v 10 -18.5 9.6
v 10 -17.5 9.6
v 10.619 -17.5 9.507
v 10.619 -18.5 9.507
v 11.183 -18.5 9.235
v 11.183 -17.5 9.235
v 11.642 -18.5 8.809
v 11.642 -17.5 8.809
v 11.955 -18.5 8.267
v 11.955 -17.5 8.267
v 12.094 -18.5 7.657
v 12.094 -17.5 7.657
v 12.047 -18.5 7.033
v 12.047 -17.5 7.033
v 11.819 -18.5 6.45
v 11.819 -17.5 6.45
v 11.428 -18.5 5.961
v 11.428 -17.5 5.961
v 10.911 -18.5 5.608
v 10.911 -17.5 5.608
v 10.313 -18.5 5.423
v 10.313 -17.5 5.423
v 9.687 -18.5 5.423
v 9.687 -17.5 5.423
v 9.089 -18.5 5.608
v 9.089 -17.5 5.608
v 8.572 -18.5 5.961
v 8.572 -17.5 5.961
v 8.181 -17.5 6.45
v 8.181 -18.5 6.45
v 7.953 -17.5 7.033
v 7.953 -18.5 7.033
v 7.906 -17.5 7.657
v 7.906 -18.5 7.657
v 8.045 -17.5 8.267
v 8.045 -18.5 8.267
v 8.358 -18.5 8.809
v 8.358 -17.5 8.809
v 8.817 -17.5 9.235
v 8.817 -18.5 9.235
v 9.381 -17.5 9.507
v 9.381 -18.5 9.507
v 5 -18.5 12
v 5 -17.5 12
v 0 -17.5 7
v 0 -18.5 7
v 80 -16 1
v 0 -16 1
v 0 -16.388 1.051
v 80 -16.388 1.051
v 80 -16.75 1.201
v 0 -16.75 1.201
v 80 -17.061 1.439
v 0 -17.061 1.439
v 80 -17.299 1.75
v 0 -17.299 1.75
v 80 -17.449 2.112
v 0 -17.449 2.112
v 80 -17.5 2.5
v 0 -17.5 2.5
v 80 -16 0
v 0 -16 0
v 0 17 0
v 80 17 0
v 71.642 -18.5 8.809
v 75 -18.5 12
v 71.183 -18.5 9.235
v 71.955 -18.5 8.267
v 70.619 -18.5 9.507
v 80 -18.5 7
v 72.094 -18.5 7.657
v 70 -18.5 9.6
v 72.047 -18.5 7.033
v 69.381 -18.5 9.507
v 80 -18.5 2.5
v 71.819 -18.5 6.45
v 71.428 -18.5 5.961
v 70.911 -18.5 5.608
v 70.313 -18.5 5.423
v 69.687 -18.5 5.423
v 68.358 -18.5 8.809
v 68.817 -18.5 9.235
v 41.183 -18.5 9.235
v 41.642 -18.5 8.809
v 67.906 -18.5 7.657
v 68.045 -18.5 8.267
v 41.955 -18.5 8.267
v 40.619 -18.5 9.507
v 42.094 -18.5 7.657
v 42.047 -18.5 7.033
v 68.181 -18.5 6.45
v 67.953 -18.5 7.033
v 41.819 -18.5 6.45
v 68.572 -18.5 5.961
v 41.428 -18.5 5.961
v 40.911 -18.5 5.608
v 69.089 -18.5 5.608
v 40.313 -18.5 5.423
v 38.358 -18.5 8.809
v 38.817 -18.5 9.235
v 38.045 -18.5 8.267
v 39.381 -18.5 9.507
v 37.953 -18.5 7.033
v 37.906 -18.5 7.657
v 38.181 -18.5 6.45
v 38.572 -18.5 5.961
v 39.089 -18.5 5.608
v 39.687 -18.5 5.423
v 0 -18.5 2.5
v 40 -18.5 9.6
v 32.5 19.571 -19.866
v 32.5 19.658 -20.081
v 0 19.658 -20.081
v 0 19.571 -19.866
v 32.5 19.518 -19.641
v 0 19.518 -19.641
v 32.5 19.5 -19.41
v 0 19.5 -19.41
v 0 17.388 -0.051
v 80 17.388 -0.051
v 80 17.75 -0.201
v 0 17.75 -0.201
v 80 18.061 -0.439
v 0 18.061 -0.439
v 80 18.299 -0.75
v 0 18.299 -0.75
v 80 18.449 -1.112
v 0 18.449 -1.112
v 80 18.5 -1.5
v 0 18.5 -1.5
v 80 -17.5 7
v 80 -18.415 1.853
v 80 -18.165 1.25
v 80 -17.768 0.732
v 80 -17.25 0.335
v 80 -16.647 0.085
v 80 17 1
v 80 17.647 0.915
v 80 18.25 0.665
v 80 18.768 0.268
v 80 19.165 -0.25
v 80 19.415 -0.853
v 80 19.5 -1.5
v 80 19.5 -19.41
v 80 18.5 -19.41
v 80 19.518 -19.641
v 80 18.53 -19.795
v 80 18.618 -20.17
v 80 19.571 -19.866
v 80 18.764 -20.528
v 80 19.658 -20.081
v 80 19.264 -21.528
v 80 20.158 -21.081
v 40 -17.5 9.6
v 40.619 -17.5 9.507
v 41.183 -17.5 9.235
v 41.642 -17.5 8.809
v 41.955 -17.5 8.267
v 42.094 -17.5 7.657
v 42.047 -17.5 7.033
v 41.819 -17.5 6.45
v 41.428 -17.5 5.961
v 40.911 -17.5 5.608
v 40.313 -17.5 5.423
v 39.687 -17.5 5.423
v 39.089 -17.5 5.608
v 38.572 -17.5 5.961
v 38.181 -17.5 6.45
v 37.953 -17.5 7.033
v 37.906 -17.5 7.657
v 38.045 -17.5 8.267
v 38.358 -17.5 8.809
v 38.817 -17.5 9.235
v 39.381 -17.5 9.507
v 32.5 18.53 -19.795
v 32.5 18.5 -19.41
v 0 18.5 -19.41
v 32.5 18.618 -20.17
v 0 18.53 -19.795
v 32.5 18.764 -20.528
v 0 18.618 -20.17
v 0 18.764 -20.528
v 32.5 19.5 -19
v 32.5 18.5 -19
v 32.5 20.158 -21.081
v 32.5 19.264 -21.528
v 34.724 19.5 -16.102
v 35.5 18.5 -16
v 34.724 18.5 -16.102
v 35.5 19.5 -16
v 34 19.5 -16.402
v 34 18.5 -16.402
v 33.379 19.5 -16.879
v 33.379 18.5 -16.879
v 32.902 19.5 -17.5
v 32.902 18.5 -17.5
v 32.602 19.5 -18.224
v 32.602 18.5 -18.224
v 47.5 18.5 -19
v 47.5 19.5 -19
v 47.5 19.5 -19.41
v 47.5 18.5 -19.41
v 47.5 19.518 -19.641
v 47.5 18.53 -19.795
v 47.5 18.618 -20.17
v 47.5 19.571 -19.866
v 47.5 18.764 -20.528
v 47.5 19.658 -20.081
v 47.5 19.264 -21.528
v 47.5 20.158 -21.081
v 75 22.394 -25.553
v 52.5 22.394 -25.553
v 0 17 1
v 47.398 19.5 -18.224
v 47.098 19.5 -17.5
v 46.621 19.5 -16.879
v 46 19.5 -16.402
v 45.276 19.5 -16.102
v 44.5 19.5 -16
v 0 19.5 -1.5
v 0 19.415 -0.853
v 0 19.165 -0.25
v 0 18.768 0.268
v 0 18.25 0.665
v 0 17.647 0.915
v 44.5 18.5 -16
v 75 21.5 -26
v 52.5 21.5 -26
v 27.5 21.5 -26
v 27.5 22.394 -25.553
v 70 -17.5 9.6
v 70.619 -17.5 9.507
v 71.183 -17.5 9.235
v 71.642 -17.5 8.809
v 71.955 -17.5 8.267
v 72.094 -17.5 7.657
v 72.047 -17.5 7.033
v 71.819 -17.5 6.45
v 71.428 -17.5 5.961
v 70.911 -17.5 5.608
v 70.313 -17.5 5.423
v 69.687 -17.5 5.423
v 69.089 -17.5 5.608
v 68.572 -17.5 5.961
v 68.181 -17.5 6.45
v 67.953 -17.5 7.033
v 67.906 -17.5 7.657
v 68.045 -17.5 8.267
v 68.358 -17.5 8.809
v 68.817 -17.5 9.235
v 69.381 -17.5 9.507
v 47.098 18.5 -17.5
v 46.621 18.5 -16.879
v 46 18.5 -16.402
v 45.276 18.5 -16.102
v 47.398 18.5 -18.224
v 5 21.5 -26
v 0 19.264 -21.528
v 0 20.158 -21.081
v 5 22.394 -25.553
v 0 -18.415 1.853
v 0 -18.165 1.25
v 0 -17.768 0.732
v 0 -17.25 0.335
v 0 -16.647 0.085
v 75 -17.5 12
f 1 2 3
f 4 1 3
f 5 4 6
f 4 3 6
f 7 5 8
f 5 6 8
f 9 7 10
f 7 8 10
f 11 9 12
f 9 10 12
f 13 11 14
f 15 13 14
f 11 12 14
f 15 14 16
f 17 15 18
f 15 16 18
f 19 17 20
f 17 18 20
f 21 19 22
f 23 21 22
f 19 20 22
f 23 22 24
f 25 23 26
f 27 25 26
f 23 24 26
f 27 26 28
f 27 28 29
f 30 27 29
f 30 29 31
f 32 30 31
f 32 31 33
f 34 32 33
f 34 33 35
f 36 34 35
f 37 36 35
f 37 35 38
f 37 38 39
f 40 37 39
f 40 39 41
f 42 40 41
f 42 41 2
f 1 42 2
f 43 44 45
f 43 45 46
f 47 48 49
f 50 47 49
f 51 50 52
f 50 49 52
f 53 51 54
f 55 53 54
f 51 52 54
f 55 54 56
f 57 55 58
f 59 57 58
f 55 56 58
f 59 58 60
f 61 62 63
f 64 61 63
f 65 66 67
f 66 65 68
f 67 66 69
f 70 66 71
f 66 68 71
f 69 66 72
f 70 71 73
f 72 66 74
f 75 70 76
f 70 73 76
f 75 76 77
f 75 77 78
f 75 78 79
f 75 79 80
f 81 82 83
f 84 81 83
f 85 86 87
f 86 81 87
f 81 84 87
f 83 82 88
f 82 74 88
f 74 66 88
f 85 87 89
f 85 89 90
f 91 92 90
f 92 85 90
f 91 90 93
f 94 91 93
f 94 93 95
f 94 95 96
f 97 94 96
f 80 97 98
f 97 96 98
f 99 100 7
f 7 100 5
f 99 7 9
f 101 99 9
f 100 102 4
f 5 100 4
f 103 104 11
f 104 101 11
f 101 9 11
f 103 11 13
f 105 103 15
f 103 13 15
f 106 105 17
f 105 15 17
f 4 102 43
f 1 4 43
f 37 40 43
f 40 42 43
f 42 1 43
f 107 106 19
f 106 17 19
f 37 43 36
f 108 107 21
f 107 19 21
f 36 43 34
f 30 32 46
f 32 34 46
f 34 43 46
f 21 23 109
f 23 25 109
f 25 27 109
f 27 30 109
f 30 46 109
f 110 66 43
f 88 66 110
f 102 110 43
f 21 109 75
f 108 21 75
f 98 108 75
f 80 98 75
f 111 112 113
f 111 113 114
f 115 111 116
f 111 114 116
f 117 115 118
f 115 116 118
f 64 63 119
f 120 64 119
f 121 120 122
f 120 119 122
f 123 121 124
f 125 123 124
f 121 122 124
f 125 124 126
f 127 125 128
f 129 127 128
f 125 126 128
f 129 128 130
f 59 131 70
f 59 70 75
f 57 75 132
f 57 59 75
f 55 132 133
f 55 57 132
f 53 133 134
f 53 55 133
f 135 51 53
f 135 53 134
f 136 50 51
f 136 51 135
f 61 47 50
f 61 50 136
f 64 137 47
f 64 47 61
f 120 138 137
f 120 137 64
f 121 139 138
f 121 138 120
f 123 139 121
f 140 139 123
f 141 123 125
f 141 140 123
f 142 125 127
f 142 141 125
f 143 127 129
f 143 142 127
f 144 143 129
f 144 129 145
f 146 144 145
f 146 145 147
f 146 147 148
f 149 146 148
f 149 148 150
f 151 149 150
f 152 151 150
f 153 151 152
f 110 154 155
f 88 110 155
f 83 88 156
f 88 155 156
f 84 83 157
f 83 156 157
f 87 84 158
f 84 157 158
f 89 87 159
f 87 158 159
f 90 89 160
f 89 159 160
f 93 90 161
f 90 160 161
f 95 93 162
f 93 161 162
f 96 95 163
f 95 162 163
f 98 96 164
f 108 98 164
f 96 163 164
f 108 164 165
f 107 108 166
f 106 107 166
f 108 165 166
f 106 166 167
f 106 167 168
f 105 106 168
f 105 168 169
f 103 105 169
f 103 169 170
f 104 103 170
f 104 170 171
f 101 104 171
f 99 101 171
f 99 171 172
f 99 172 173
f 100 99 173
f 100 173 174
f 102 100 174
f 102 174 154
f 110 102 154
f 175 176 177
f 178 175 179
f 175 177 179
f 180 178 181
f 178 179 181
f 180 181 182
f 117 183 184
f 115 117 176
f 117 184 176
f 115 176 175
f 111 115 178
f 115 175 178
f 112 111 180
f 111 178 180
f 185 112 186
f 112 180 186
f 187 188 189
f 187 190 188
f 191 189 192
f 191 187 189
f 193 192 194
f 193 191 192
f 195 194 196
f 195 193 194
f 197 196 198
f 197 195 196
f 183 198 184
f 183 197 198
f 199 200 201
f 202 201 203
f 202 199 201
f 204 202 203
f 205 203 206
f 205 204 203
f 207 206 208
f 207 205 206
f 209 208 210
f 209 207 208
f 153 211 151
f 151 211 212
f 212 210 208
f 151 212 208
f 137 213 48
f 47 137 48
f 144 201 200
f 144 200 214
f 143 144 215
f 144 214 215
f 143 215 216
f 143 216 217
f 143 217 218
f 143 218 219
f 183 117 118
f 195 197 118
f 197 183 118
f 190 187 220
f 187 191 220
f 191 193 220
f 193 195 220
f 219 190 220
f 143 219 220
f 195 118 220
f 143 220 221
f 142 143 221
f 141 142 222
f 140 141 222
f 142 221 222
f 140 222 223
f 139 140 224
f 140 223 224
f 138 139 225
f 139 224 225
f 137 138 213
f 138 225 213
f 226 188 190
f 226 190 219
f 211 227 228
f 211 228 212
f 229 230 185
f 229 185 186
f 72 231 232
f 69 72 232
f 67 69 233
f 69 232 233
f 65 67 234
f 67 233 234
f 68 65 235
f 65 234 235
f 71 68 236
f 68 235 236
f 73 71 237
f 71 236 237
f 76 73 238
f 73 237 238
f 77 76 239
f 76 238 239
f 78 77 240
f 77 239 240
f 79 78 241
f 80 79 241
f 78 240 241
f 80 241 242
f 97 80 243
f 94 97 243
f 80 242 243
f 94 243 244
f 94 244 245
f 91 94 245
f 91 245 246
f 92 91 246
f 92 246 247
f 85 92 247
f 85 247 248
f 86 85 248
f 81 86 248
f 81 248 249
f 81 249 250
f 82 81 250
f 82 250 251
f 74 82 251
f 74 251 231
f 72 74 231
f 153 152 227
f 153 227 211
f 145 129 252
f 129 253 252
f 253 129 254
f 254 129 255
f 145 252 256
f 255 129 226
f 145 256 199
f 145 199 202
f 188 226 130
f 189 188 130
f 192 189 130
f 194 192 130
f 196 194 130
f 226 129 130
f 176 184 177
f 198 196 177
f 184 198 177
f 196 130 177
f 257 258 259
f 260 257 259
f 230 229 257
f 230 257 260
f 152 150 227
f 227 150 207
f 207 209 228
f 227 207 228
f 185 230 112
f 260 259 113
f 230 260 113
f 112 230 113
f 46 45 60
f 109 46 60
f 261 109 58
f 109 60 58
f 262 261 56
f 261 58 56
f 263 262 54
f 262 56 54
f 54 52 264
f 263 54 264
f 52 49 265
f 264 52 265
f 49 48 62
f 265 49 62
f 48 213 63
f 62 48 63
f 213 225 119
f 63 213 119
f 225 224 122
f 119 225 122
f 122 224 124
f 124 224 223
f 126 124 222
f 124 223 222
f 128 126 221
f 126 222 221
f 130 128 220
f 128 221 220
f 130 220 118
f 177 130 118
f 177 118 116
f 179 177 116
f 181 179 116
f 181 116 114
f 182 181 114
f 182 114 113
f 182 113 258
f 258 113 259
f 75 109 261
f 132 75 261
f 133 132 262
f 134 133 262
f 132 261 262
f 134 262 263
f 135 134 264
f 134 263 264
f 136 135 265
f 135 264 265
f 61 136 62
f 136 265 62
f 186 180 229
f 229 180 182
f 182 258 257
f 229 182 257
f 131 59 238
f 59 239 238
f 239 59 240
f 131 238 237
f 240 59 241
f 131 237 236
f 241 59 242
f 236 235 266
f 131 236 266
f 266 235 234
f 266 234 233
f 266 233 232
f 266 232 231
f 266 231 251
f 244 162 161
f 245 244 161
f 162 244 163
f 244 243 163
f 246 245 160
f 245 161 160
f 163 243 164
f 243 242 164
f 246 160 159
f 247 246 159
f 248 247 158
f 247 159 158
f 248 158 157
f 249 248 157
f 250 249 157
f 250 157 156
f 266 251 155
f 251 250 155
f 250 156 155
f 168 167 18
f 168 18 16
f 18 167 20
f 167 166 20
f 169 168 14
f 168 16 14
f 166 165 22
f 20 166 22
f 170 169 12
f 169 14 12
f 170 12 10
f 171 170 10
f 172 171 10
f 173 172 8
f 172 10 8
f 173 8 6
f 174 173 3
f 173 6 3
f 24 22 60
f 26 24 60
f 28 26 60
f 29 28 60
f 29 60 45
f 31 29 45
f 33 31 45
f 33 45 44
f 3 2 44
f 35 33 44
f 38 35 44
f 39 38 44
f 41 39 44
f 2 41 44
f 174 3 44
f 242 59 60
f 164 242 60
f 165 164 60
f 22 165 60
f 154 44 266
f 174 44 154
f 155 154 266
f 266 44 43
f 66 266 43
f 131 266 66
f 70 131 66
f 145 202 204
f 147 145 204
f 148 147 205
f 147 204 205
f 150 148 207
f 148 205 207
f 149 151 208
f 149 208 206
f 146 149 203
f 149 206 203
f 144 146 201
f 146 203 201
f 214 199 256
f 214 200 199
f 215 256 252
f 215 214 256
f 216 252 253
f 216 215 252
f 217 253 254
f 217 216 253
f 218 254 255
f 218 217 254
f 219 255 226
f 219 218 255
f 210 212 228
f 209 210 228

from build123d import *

# Parameters (mm, degrees)
BASE_FLANGE1_DEPTH       = 80
SKETCH7_R                = 2.1
CUT_EXTRUDE2_DEPTH       = 94.099760047
LPATTERN1_COUNT          = 2
LPATTERN1_PITCH          = 30
LPATTERN1_COL_COUNT      = 2
LPATTERN1_COL_PITCH      = 30
CUT_EXTRUDE_1_DEPTH      = 93.303846074
CUT_EXTRUDE_1_DEPTH_BACK = 93.303846074
SKETCH_1_W               = 15
SKETCH_1_H               = 10
CHAMFER_1_SIZE           = 5
FILLET_1_R               = 3


# Read off the part's stored shape, not the designer's step: Base-Flange1
with BuildPart() as part:
    # Base-Flange1 outline → Base-Flange1 (new body)
    with BuildSketch(Plane(origin=(0, 0, 0), x_dir=(0, 0, -1), z_dir=(1, 0, 0))):
        with BuildLine():
            Line((-2.5, -17.5), (-12, -17.5))
            Line((-12, -17.5), (-12, -18.5))
            Line((-12, -18.5), (-2.5, -18.5))
            ThreePointArc((-2.5, -18.5), (-0.732233047, -17.767766953), (0, -16))
            Line((0, -16), (0, 17))
            ThreePointArc((0, 17), (0.439339828, 18.060660172), (1.5, 18.5))
            Line((1.5, 18.5), (19.409830056, 18.5))
            ThreePointArc((19.409830056, 18.5), (19.984212358, 18.566877526), (20.527864045, 18.763932023))
            Line((20.527864045, 18.763932023), (26, 21.5))
            Line((26, 21.5), (25.552786405, 22.394427191))
            Line((25.552786405, 22.394427191), (20.08065045, 19.658359214))
            ThreePointArc((20.08065045, 19.658359214), (19.754459437, 19.540126516), (19.409830056, 19.5))
            Line((19.409830056, 19.5), (1.5, 19.5))
            ThreePointArc((1.5, 19.5), (-0.267766953, 18.767766953), (-1, 17))
            Line((-1, 17), (-1, -16))
            ThreePointArc((-1, -16), (-1.439339828, -17.060660172), (-2.5, -17.5))
        make_face()
    extrude(amount=BASE_FLANGE1_DEPTH)

    # Sketch7 → Cut-Extrude2 (cut, through all)
    with BuildSketch(Plane(origin=(0, -17.5, 0), x_dir=(1, 0, 0), z_dir=(0, 1, 0))):
        with Locations(Location((40, -7.5, 0), (0, 0, 270))):
            Circle(SKETCH7_R)
    cut_extrude2 = extrude(amount=-CUT_EXTRUDE2_DEPTH, mode=Mode.SUBTRACT)

    # LPattern1: Cut-Extrude2 ×2
    with Locations(*[(i * LPATTERN1_PITCH, 0, 0) for i in range(1, LPATTERN1_COUNT)]):
        add(cut_extrude2, mode=Mode.SUBTRACT)

    # LPattern1 col: Cut-Extrude2 ×2
    with Locations(*[(-i * LPATTERN1_COL_PITCH, 0, 0) for i in range(1, LPATTERN1_COL_COUNT)]):
        add(cut_extrude2, mode=Mode.SUBTRACT)

    # Sketch 1 → 除料-伸長1 (cut, two sides: drawn at the far end of the back side and taken through both)
    with BuildSketch(Plane(origin=(0, 19.5, 0), x_dir=(1, 0, 0), z_dir=(0, 1, 0)).offset(-CUT_EXTRUDE_1_DEPTH_BACK)):
        with Locations((40, 21)):
            Rectangle(SKETCH_1_W, SKETCH_1_H)
    extrude(amount=CUT_EXTRUDE_1_DEPTH + CUT_EXTRUDE_1_DEPTH_BACK, mode=Mode.SUBTRACT)

    # 導角1
    chamfer_1_edges = [part.edges().sort_by_distance(p)[0] for p in [
        (32.5, 21.947213595, -25.776393202),
        (47.5, 21.947213595, -25.776393202),
        (0, 21.947213595, -25.776393202),
        (0, -18, 12),
        (80, 21.947213595, -25.776393202),
        (80, -18, 12),
    ]]
    chamfer(chamfer_1_edges, length=CHAMFER_1_SIZE)

    # 圓角1
    fillet_1_edges = [part.edges().sort_by_distance(p)[0] for p in [
        (32.5, 19, -16),
        (47.5, 19, -16),
    ]]
    fillet(fillet_1_edges, radius=FILLET_1_R)


solid = part.part
